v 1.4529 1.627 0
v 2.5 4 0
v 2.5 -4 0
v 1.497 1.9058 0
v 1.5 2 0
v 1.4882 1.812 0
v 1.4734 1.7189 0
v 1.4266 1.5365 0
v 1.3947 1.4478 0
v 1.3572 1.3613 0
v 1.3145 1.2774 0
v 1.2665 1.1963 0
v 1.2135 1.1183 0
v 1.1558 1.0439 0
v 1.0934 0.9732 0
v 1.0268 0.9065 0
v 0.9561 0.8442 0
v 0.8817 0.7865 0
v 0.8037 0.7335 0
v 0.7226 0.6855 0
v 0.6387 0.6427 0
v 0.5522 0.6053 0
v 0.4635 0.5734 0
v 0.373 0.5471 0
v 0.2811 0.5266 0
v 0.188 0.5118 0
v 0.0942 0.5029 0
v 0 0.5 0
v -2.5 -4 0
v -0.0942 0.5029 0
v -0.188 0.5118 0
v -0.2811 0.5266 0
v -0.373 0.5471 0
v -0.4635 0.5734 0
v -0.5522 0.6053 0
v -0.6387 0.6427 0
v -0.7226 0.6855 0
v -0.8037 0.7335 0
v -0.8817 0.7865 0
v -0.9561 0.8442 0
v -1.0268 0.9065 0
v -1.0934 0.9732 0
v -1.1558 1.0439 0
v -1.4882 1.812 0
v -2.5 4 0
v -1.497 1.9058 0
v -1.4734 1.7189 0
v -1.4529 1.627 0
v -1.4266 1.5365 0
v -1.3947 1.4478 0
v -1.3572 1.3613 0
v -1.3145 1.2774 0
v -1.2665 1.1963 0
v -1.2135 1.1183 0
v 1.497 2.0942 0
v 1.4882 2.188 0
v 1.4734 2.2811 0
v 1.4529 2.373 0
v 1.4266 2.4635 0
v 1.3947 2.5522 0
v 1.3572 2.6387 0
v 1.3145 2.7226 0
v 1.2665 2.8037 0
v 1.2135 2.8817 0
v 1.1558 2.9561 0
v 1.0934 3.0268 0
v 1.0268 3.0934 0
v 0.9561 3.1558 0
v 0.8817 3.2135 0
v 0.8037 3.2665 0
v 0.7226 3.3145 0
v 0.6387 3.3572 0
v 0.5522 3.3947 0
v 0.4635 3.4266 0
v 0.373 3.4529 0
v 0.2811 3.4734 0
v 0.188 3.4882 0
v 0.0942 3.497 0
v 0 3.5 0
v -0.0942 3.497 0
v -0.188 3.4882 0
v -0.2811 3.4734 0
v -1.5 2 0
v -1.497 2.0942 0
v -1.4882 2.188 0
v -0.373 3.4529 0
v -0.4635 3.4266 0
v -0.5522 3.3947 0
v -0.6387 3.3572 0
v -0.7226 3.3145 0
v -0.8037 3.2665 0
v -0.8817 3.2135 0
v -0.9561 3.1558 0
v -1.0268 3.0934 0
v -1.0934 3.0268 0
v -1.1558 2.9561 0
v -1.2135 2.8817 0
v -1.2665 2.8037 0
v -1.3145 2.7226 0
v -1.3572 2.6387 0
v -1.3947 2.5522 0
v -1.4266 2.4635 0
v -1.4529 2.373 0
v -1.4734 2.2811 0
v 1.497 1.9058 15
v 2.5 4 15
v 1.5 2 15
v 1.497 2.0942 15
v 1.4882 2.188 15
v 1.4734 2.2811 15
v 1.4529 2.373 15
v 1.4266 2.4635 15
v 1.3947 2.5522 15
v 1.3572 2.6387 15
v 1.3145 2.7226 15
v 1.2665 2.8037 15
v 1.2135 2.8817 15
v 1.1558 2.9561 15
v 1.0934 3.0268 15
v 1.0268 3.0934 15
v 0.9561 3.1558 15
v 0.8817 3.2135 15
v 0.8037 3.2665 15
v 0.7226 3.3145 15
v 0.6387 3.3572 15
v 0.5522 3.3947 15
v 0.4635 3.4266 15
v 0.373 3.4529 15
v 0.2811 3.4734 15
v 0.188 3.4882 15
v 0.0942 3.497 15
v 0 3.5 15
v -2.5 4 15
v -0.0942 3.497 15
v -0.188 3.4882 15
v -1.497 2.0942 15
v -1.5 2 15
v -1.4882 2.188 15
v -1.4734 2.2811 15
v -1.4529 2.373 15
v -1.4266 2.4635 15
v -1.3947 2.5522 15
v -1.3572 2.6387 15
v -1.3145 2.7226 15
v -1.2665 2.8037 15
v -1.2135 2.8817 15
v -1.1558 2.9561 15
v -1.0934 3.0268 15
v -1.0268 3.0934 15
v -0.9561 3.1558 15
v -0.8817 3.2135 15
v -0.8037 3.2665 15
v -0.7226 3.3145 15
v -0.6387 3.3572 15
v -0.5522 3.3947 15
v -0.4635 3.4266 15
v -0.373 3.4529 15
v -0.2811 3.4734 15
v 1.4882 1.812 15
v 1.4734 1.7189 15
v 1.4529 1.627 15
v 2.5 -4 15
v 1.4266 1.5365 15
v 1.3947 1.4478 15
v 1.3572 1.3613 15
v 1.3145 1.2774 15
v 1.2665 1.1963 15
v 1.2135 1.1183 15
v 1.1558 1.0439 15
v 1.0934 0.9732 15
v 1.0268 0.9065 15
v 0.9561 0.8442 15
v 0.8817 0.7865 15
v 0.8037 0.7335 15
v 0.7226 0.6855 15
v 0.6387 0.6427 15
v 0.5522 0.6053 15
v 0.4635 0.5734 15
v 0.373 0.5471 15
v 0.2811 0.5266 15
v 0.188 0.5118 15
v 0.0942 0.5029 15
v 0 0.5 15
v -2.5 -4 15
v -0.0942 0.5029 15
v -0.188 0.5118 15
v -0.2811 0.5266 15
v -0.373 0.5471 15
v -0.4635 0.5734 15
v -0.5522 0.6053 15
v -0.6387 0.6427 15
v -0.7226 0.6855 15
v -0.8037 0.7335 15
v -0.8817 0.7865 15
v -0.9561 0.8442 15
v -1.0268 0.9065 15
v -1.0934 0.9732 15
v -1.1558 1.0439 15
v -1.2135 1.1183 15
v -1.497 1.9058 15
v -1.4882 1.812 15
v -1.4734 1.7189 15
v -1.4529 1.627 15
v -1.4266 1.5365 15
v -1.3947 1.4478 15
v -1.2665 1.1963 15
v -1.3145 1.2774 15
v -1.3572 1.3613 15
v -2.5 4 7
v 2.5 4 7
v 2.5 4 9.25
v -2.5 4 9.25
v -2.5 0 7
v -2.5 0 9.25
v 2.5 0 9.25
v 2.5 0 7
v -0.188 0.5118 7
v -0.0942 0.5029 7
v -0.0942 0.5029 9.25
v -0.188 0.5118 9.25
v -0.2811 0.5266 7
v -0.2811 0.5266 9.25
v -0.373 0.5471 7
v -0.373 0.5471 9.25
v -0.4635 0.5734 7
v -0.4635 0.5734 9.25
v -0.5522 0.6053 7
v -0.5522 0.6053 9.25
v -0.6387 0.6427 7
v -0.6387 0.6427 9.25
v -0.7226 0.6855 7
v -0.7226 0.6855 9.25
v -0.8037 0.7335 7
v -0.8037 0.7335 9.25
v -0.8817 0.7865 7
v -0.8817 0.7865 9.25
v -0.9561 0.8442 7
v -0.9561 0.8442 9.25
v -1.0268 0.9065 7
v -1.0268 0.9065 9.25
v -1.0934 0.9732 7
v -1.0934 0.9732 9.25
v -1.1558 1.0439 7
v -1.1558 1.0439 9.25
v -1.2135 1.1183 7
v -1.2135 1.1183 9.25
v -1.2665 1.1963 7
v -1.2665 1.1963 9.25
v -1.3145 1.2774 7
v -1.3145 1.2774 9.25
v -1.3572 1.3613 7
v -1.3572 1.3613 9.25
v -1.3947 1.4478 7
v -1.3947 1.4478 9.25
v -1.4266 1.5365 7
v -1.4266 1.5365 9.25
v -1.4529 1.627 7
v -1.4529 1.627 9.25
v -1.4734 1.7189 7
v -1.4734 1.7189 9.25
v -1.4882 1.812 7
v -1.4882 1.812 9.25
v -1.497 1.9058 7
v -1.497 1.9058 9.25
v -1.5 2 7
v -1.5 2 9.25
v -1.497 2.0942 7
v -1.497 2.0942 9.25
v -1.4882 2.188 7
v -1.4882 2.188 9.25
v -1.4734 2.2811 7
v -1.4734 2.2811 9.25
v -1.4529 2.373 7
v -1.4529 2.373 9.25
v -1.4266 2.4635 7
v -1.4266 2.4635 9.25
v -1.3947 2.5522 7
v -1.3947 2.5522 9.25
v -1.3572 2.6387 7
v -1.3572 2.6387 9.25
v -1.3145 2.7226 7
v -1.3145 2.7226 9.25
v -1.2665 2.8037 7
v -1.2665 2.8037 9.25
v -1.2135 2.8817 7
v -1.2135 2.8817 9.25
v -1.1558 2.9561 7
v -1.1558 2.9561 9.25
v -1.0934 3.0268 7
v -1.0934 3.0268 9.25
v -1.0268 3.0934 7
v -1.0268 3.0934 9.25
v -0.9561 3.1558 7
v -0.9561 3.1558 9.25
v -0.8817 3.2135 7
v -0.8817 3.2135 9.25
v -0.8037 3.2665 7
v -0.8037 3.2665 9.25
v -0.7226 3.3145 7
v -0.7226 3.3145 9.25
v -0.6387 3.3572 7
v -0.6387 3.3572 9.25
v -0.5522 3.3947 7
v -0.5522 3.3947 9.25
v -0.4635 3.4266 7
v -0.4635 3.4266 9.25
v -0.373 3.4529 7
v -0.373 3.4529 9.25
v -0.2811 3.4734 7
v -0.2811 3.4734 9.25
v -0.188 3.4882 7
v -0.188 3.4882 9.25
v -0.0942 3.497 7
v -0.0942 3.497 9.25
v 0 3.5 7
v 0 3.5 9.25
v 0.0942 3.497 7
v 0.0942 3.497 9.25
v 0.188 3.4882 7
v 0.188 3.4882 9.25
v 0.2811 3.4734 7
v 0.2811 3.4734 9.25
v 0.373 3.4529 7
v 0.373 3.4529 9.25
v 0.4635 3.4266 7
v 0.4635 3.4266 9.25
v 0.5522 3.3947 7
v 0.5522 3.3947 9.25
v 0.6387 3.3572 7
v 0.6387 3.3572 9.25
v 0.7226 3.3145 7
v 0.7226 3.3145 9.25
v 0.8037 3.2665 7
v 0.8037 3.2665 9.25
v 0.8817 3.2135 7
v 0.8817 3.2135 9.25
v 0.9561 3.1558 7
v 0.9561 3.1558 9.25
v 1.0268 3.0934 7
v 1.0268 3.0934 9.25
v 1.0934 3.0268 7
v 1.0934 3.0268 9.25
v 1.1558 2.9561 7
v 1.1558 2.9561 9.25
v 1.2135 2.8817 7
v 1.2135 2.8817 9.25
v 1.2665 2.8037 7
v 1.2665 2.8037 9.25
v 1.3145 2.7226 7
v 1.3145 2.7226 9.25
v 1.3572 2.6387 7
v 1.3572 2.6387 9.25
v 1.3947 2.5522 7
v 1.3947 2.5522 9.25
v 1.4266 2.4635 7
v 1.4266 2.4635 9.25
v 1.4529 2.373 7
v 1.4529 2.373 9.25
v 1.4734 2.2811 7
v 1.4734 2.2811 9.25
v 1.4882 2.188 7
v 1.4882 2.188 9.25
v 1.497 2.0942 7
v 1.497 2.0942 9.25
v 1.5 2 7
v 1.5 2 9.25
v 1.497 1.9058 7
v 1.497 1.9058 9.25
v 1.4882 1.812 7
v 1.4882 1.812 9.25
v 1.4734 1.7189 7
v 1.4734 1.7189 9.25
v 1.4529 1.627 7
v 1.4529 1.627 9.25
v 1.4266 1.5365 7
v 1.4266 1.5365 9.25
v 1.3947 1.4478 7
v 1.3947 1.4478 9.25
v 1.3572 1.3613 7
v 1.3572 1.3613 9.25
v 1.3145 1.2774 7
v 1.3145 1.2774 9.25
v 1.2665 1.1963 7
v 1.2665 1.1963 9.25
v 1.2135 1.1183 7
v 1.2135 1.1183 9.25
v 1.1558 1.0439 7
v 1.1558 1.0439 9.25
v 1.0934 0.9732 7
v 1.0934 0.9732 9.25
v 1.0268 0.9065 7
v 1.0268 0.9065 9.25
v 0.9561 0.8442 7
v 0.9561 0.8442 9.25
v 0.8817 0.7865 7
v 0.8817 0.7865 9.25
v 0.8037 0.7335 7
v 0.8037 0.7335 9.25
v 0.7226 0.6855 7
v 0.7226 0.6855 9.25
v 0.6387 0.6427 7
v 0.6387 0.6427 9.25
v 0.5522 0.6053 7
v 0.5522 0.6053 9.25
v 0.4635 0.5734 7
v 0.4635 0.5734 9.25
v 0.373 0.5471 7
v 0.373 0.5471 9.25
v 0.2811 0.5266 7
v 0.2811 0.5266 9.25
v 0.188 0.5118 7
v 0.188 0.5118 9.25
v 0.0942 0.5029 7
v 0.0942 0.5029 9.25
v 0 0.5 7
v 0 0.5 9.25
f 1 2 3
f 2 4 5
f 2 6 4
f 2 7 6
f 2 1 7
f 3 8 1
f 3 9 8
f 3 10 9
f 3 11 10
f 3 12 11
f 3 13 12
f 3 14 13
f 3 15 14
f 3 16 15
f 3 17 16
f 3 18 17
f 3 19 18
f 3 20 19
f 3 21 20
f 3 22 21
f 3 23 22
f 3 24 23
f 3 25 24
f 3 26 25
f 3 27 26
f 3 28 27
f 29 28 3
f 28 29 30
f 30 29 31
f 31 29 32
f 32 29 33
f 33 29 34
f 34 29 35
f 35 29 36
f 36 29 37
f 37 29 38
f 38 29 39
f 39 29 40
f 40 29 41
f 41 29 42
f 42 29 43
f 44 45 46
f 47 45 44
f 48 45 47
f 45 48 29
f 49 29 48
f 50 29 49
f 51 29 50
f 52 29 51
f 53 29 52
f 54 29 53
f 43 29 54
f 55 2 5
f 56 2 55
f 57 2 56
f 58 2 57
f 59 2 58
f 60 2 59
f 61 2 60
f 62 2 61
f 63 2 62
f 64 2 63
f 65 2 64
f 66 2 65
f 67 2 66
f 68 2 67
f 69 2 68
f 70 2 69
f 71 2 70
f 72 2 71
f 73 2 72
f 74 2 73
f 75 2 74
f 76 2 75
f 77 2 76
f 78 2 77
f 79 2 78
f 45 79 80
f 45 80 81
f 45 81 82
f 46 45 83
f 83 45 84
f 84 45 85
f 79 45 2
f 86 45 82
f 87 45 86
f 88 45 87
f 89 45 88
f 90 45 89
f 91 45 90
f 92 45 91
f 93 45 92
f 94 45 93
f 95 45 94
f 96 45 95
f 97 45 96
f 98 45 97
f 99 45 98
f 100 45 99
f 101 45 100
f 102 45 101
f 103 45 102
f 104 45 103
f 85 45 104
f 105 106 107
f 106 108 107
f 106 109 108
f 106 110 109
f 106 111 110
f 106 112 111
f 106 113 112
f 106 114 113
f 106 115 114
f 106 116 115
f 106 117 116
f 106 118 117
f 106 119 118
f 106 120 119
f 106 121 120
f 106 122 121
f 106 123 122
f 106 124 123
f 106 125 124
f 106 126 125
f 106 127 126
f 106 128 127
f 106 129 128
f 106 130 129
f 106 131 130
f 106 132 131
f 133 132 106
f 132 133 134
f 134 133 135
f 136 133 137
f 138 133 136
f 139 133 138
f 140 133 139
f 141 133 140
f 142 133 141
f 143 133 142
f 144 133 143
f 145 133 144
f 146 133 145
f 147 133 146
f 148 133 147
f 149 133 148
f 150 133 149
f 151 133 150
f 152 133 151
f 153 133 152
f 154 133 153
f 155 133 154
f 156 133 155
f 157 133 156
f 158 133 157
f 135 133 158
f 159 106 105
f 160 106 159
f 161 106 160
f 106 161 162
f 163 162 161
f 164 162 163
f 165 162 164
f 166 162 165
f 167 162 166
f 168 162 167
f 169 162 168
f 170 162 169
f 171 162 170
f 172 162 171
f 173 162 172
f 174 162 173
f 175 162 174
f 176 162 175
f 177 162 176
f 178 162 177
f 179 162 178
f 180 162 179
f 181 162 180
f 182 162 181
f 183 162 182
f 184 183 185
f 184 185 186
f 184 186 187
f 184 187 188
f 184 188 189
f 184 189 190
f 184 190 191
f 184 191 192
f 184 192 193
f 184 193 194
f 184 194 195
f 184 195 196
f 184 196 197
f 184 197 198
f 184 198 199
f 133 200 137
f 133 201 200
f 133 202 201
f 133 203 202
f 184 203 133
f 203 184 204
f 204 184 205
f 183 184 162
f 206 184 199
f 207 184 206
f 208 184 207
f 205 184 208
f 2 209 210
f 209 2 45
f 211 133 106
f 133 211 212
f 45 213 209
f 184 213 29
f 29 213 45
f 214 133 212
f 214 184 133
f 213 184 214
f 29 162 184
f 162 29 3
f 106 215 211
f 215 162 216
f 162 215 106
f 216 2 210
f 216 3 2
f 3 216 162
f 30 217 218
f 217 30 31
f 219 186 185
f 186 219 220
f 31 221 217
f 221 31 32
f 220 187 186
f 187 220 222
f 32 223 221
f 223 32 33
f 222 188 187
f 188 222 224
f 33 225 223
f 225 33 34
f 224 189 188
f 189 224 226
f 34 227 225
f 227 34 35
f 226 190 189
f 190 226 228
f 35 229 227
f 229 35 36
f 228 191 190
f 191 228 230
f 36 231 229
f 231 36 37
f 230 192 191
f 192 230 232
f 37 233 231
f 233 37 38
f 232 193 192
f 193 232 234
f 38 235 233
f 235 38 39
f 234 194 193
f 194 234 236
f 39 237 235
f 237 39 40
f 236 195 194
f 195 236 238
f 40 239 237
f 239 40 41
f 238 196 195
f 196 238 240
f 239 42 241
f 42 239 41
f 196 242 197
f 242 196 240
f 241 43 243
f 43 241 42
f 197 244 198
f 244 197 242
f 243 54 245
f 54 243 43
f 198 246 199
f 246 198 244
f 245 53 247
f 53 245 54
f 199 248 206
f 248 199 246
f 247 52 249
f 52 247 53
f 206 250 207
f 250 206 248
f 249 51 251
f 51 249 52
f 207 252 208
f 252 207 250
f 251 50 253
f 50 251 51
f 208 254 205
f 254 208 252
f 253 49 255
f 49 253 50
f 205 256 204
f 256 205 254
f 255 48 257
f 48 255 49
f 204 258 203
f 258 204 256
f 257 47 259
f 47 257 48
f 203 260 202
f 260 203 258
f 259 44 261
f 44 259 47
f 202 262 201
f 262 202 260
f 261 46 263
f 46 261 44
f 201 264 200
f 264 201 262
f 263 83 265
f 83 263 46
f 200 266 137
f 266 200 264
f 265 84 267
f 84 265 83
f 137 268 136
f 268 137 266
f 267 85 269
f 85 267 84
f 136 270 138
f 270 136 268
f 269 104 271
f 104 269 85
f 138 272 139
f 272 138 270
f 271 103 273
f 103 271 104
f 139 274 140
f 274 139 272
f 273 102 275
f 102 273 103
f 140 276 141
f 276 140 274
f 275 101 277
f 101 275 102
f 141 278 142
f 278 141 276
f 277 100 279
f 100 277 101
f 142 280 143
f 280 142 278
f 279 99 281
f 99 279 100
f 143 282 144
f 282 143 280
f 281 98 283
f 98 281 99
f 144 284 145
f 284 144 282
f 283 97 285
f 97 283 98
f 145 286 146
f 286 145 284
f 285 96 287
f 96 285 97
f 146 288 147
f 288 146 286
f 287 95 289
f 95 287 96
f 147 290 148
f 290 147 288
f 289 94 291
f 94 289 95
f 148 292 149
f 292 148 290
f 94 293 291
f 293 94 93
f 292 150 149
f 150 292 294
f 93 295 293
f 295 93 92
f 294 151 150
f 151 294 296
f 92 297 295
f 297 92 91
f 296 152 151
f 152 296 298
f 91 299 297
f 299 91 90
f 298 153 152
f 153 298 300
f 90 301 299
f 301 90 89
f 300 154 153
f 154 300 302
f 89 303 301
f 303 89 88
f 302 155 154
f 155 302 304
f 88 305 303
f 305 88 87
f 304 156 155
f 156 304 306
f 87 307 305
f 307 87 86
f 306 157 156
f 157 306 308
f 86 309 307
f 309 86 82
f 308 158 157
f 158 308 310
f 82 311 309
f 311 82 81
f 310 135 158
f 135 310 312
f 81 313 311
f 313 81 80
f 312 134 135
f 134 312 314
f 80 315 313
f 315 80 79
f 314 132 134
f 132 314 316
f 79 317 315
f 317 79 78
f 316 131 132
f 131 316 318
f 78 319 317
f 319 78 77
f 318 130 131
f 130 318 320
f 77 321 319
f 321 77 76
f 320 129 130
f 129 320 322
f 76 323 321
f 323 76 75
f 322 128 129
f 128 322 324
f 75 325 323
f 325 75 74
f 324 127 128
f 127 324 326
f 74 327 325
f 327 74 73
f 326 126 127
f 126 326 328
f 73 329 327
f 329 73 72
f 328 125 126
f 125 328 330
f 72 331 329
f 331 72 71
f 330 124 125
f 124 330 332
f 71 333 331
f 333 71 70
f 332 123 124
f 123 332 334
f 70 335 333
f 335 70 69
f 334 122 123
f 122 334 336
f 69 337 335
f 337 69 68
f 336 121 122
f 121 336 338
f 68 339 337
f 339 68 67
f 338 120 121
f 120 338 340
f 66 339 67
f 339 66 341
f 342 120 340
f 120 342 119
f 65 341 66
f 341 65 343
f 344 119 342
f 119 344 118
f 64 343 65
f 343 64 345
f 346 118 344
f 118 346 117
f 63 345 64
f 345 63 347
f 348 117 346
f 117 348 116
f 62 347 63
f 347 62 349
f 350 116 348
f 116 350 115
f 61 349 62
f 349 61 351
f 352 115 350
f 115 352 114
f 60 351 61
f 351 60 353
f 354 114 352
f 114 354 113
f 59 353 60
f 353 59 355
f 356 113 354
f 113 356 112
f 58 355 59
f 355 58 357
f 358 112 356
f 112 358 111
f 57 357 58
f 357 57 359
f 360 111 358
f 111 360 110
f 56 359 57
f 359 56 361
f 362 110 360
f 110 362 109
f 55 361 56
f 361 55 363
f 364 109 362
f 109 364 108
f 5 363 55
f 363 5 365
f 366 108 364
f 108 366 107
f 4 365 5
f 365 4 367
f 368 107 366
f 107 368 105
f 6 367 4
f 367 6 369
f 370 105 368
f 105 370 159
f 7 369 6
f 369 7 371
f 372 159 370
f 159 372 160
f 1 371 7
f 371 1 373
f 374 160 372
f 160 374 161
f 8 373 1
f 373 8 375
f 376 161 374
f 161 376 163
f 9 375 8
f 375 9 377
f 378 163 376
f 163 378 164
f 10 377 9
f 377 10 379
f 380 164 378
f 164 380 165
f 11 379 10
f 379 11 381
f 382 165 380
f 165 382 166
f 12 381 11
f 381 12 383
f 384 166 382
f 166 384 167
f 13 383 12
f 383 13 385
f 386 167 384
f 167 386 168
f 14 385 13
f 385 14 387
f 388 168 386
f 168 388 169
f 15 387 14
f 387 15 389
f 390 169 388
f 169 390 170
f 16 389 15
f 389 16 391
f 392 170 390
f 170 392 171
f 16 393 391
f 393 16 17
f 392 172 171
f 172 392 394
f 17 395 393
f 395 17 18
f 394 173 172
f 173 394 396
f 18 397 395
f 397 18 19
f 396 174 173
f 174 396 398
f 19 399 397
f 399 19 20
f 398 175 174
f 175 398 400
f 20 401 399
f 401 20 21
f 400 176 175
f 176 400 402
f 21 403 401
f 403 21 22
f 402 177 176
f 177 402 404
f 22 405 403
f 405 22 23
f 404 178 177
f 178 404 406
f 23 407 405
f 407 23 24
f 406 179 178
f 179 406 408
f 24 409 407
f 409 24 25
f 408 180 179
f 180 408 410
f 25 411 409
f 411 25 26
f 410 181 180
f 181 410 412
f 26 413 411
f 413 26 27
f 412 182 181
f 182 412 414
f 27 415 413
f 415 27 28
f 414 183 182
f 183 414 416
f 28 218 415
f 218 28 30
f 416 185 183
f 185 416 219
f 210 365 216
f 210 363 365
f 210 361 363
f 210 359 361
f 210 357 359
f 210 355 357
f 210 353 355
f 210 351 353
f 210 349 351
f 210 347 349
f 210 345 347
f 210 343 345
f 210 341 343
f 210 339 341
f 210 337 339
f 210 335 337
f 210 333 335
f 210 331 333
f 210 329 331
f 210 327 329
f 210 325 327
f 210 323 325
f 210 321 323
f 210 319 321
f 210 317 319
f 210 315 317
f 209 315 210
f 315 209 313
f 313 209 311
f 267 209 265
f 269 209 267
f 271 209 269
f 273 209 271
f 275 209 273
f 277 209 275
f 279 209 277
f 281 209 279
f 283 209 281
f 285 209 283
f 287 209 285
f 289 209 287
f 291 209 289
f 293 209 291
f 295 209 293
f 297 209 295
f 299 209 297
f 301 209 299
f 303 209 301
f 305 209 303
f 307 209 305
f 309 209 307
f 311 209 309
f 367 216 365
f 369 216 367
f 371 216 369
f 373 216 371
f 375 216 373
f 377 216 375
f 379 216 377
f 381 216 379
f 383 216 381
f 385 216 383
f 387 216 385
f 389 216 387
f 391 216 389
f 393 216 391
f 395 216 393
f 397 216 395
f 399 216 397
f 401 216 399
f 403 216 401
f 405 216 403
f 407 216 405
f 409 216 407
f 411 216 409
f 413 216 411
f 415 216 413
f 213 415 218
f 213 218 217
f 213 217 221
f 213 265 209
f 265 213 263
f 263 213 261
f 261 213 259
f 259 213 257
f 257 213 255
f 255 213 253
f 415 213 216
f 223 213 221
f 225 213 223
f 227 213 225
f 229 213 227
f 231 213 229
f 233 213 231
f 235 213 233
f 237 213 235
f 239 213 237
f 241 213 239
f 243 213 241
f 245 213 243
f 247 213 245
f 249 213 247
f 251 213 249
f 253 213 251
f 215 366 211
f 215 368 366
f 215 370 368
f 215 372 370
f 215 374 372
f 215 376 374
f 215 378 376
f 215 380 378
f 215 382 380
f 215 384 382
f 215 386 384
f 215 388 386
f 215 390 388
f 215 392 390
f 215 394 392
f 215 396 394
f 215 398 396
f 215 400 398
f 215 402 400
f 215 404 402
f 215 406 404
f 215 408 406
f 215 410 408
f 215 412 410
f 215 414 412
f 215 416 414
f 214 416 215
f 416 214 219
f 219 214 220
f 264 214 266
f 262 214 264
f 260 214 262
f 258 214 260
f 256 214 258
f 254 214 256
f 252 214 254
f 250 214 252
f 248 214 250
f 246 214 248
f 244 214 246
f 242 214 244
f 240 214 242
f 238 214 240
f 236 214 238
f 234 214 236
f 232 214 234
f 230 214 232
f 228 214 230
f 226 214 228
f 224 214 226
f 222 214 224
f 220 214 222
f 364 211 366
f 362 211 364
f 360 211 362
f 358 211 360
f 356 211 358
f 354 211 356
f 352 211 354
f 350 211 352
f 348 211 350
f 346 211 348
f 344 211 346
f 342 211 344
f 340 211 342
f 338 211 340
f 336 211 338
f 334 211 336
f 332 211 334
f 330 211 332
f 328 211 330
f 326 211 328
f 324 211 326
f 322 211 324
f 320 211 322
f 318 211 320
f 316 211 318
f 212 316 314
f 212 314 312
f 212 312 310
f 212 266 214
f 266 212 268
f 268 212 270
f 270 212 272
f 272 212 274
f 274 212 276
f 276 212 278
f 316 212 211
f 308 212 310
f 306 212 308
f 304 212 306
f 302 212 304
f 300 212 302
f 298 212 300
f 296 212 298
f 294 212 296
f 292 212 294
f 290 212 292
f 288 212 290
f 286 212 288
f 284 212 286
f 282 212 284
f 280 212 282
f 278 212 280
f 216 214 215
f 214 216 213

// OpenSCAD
difference() {
    
    linear_extrude(15)
    difference() {
        square([5, 8], center=true);
        translate([0, 2, 0])
        circle(d=3, $fn=100);
    }

    color("red")
    translate([0, 2, 7])
    linear_extrude(2.25)
    square([51, 4], center=true);
}
